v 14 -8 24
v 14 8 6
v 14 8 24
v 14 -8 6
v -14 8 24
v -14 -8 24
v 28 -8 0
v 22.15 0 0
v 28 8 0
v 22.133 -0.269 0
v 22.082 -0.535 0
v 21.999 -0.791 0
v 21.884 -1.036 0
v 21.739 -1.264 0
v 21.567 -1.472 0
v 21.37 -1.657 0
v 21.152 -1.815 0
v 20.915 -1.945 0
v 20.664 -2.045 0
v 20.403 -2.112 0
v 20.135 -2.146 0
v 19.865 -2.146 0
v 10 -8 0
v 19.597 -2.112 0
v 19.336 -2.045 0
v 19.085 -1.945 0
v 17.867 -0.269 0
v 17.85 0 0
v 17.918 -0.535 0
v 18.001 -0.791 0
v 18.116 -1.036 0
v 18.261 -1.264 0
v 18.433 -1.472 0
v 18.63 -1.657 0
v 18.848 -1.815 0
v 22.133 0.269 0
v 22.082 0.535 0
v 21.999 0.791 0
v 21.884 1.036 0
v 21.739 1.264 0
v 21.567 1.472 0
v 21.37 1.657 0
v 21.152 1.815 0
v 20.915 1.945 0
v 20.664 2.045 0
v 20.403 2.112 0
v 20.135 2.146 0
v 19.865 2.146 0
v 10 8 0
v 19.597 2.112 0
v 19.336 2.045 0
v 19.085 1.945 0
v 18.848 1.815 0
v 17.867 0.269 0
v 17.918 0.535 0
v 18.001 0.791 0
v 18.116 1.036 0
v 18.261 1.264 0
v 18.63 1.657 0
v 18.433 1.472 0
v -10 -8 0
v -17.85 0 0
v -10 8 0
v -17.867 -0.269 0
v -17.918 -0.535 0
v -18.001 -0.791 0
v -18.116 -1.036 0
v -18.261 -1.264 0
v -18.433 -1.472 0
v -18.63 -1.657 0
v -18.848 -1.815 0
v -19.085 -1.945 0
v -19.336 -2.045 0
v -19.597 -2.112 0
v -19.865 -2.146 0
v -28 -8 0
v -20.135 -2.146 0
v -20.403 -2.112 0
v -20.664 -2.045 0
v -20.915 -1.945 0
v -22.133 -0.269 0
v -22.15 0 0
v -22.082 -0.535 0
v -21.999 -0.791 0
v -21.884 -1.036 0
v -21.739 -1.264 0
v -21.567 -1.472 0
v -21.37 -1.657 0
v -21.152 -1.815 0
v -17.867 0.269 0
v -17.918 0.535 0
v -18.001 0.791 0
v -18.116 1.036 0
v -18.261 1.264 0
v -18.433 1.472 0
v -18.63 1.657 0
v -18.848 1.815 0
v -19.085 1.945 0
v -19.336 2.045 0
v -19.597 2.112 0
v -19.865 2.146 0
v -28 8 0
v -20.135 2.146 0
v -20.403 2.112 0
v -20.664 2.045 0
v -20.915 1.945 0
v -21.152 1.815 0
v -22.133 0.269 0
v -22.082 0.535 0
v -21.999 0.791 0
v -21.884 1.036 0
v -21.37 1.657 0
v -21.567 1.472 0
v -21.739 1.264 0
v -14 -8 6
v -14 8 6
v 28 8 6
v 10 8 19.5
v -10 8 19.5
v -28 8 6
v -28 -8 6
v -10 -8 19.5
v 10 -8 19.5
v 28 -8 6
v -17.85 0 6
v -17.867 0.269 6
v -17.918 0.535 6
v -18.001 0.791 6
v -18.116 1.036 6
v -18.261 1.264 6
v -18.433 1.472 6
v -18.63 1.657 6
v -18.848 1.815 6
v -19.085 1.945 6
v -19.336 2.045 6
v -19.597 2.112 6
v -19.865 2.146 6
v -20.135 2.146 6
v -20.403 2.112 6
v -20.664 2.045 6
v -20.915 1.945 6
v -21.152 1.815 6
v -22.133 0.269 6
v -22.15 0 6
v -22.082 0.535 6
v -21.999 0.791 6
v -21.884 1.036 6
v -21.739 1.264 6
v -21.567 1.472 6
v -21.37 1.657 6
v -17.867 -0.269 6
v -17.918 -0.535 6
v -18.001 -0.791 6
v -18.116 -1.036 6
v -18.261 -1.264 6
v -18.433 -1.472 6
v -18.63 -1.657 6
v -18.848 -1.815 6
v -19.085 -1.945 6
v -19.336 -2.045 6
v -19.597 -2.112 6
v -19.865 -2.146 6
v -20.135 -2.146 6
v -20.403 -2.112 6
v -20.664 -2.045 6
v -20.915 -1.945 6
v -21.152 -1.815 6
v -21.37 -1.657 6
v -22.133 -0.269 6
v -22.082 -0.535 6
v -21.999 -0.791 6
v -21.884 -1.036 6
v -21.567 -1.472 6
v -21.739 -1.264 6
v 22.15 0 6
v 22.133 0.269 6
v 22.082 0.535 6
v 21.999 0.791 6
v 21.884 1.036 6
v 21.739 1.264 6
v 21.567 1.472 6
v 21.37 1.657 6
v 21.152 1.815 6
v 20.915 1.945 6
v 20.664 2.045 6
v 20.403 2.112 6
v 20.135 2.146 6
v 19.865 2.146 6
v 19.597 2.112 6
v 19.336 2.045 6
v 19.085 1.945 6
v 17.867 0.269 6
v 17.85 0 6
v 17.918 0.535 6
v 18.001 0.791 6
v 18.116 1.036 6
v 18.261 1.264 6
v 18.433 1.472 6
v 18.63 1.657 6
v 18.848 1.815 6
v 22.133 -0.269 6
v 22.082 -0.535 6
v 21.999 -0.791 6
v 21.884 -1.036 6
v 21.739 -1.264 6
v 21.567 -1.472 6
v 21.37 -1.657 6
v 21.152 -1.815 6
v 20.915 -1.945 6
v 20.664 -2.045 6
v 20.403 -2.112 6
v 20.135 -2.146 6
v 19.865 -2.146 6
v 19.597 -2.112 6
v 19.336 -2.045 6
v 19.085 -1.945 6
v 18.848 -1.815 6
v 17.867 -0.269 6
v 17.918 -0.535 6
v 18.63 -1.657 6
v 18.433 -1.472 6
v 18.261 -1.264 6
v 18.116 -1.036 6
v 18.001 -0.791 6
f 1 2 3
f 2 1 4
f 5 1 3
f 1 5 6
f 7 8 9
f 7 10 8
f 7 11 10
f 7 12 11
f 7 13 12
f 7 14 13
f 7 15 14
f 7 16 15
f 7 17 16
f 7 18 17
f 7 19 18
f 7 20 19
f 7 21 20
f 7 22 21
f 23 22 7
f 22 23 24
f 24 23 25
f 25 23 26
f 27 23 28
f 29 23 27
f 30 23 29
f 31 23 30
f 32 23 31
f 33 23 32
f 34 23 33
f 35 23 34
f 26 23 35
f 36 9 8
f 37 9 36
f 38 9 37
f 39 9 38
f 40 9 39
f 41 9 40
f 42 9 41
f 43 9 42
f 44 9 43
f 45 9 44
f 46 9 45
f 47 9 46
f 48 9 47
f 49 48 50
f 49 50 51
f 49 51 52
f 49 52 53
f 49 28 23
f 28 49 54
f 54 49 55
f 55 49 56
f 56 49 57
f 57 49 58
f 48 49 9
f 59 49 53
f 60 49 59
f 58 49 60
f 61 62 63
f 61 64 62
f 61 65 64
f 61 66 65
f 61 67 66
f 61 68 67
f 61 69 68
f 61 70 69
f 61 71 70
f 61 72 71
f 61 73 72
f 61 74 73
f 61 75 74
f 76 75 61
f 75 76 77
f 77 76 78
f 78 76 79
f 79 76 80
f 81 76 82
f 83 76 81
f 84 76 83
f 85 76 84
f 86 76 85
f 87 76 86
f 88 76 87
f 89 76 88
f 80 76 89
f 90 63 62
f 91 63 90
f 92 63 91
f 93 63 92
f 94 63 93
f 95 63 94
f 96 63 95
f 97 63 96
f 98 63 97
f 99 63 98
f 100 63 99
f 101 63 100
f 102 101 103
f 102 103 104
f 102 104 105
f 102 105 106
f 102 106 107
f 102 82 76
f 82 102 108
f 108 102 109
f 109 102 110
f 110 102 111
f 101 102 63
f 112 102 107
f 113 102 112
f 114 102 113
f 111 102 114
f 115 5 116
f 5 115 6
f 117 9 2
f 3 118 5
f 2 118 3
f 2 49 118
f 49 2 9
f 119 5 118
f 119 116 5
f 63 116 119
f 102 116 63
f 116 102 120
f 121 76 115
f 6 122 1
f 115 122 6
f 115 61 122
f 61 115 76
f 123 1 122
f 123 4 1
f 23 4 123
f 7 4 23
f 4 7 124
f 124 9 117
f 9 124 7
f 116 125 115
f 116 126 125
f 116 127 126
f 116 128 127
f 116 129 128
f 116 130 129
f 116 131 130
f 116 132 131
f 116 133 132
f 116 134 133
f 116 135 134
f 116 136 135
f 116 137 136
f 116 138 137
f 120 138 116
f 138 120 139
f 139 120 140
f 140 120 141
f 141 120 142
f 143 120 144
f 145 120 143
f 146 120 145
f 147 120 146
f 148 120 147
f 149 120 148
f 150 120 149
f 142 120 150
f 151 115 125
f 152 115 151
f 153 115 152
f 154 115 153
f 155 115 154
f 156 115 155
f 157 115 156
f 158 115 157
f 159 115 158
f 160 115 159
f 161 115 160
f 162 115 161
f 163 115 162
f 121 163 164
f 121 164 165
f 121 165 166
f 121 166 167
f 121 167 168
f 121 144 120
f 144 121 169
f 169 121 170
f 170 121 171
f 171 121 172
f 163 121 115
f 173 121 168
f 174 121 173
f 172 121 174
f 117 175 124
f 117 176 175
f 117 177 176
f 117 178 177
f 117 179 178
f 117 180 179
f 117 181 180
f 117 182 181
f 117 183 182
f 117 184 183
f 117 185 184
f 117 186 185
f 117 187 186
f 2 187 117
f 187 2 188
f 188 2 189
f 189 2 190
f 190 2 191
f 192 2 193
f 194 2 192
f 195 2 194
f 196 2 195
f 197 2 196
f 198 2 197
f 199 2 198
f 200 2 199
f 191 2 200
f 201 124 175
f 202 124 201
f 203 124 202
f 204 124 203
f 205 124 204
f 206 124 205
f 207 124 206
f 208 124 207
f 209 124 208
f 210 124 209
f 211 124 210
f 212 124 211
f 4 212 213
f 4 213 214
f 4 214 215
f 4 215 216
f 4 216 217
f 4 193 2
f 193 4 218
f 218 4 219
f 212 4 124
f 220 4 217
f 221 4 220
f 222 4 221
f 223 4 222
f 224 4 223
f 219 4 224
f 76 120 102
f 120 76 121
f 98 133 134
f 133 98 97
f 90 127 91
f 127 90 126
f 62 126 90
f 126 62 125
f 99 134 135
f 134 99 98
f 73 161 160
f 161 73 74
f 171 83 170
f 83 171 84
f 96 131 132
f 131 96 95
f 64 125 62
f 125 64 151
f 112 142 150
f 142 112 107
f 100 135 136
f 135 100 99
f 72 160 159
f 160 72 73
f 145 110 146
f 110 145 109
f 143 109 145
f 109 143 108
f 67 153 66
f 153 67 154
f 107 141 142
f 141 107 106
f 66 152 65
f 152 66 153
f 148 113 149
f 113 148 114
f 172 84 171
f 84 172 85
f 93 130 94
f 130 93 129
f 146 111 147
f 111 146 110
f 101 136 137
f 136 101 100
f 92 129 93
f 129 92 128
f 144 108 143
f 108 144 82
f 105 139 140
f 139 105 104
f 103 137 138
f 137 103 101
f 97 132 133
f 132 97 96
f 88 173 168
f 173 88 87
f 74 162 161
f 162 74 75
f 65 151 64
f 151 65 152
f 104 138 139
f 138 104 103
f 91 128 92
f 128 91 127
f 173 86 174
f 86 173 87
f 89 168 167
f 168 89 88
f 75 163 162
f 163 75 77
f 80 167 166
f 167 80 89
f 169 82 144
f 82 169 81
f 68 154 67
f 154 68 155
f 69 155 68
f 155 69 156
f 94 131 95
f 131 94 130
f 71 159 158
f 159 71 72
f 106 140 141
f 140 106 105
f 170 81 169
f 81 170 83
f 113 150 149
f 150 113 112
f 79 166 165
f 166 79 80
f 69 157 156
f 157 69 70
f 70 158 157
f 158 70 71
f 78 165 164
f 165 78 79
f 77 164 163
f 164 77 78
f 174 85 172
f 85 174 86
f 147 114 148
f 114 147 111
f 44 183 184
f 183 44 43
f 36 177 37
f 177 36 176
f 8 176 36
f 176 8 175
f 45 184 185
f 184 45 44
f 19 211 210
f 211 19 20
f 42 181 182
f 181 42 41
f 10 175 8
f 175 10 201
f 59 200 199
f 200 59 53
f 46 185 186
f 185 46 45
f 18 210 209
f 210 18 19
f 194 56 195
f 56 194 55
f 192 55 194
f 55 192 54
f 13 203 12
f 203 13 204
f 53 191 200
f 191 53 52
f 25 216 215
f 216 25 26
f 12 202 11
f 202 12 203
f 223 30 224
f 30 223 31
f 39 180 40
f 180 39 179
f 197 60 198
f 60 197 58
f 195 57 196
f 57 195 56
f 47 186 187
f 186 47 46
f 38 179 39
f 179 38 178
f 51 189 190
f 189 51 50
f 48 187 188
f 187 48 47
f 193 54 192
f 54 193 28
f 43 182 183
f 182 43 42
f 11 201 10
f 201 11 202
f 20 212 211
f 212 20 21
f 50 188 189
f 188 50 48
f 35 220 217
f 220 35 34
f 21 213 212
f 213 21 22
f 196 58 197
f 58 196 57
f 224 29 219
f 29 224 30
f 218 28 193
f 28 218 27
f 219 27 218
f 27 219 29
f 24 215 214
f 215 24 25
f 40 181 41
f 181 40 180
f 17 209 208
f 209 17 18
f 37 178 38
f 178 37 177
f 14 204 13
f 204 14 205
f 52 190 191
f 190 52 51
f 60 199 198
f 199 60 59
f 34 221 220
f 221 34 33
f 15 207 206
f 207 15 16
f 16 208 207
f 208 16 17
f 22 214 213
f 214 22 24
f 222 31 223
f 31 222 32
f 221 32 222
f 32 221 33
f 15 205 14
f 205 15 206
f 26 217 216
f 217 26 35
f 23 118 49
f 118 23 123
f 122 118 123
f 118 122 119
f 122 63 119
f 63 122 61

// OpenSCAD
// file: util.scad
epsilon = 0.1;

module ring(in_rad, out_rad, height, fn = 50) {
    difference() {
        cylinder(r = out_rad, h = height, $fn = fn);
        translate([0,0,-epsilon])
           cylinder(r = in_rad, h = height+2*epsilon, $fn = fn);
    }
}
// file: params.scad
// Params for GT3 TimingBelt and accesories:
// belt
belt_width = 5;

// pulley
pulley_belt_width = belt_width * 1.2;


// General Params for the sketch
height = 700;
width = 600;
depth = 400;

profile_w = 20;

u_lower_rad = 70;
u_upper_rad = 20 + u_lower_rad;
u_lower_h = 20;
u_upper_h = 20;
u_main_hole_rad = 50;
rings_z_dist = 5;
axis_y_offset = 0;

stepper_w = 42.3;
stepper_box_h = 40;
stepper_axis_rad = 2.5;
stepper_axis_len = 24+2; // above box
stepper_all_h = stepper_box_h + stepper_axis_len;

axis_bot_elev = height - 85;
axis_top_above_upper_plate = 80;

camera_mount_rad = 300;
min_camera_z = 300;

slider_pole_w = 8;
slider_column_w = 80;

// tolerance for holes sliding on column:
slider_tol = 0.5;

camera_w = 140;
camera_d = 15;
camera_h = 40;

relief_depth = 2;

hand_support_bigR = 50;
hand_support_cutR = 20;
hand_lock_bigR = 65;
hand_lock_cutR = 10;
hand_lock_elev = 140;


// Params for main bearing plate
//   with its two rings:
glassBall_r = 8;
mainHole_r = 20;
wall_w = 4;

ring_base_w = 2*glassBall_r + 2*wall_w;
upper_ring_out_r = mainHole_r + ring_base_w;

// the angle (from horisontal) of 
//   the force ransform of the glassBalls: 
ring_contact_angle = 30;

// diff between the radiuses
//   of uper and lower rings:
ring_diff_r = 2*glassBall_r * sin(ring_contact_angle);

// the height of the slot between the rings:
ring_diff_h = glassBall_r/2;

bigger_ring_r = mainHole_r + ring_diff_r;
lower_ring_h = ring_base_w;

// maximum radious of all rings in this model:
max_r = mainHole_r + ring_base_w + 30;


// when using bearings:
bearing_in_d = 8;
bearing_out_d = 22;
bearing_h = 7;

big_washer_d = 19;


// Params for mounted camera slider:
profile2020_w = 20;
profile2020_tol = 0; // tolerance on each side (0 is OK)

M3hole_d = 3.3;
M4hole_d = 4.3;
hole_wall_dist = 4;

prof2020_fasten_plate_l = hole_wall_dist + wall_w + M4hole_d;

no_bend_beam_w = 2*wall_w;

fasten_plate_hole_dist = 10;
fasten_plate_l = 100;
fasten_plate_w = 120;
fasten_plate_h = wall_w;

rod_d = 8;
rod_holder_tol = 0; // on each side
rod_holder_fasten_block_l = 2*hole_wall_dist +
  2*fasten_plate_hole_dist + 2*M3hole_d/2;
rod_holder_fasten_block_w = 3*wall_w;
rod_holder_h = 4*wall_w;
rod_holder_fasten_h = 4*wall_w; // only the back fastener

holder_bend_len = 4;
holder_bend_close_gap = 3 + 2*rod_holder_tol;

stepper_holder_l = 4*wall_w;
// main file
include <params.scad>;
include <util.scad>

// profile2020 holder:

module prof2020_holder() {
  holder_w = profile2020_w + 2*wall_w; 
  holder_l = profile2020_w + 2*prof2020_fasten_plate_l;
  union() {
    difference() {
      cube([profile2020_w, holder_w, holder_w], center = true);

      cube([profile2020_w + 2*epsilon,
            profile2020_w + 2*profile2020_tol,
            profile2020_w + 2*profile2020_tol], center = true);
    }

    translate([0, 0, profile2020_w/2 + profile2020_tol + wall_w/2])
      difference() {
        cube([holder_l, profile2020_w, wall_w - profile2020_tol], center = true);

        translate([-profile2020_w/2 - hole_wall_dist - M4hole_d/2, 0, 0])
          cylinder(r = M4hole_d/2, h = wall_w+2*epsilon, center = true, $fn = 50);

        translate([profile2020_w/2 + hole_wall_dist + M4hole_d/2, 0, 0])
          cylinder(r = M4hole_d/2, h = wall_w+2*epsilon, center = true, $fn = 50);
    }

/* small test cubes on the sides - unneeded:
    translate([0, -(holder_w/2 + wall_w - epsilon), 0])
      cube(2*wall_w, center = true);
    translate([0, holder_w/2 + wall_w - epsilon, 0])
      cube(2*wall_w, center = true);
*/
    fasten_w = 4*fasten_plate_hole_dist + M3hole_d + 2*wall_w;
    fasten_l = fasten_plate_hole_dist + M3hole_d + 2*wall_w;
    fasten_h = 2*wall_w;
    translate([0, 0, holder_w/2 - fasten_h/2])
      difference() {
        cube([fasten_l, fasten_w, fasten_h], center = true);

        cube([fasten_l+2*epsilon, profile2020_w, fasten_h+2*epsilon], center = true);

        translate([-fasten_l/2 + wall_w + M3hole_d/2,
                   -fasten_w/2 + wall_w + M3hole_d/2, -fasten_h/2 - epsilon])
          fasten_holes_rect(2, 1, fasten_plate_hole_dist,
                            M3hole_d/2, 3*fasten_h + 2*epsilon);
        translate([-fasten_l/2 + wall_w + M3hole_d/2,
                   fasten_w/2 - (wall_w + M3hole_d/2), -fasten_h/2 - epsilon])
          fasten_holes_rect(2, 1, fasten_plate_hole_dist,
                            M3hole_d/2, 3*fasten_h + 2*epsilon);
    }
  }
}


// M8 rode holder:

rod_holder_in_r = rod_d/2 + rod_holder_tol;
rod_holder_out_r = rod_d/2 + rod_holder_tol + wall_w;

module rod_holder_ring() {
  ring(rod_holder_in_r,
       rod_holder_out_r,
       rod_holder_h);
}

module rod_holder() {
  union() {
    translate([0, -rod_holder_tol, 0])
      difference() {
        rod_holder_ring();
        
        translate([-rod_holder_out_r - epsilon, 0, -epsilon])
          cube([2*rod_holder_out_r + 2*epsilon,
                2*rod_holder_out_r + epsilon,
                rod_holder_h + 2*epsilon]);

        translate([-epsilon,
                   -holder_bend_close_gap/2 + epsilon,
                   -epsilon])
          cube([rod_holder_out_r + 2*epsilon,
                holder_bend_close_gap/2,
                rod_holder_h + 2*epsilon]);
      }
    translate([-rod_holder_out_r - holder_bend_len - epsilon, -rod_holder_tol - wall_w, 0])
      cube([holder_bend_len + wall_w,
            wall_w, rod_holder_h]);

    translate([0, rod_holder_tol, 0])
      difference() {
        rod_holder_ring();
        
        translate([-rod_holder_out_r - epsilon,
                   -(2*rod_holder_out_r + epsilon),
                   -epsilon])
          cube([2*rod_holder_out_r + 2*epsilon,
                2*rod_holder_out_r + epsilon,
                rod_holder_h + 2*epsilon]);
        
        translate([-epsilon, -epsilon, -epsilon])
          cube([rod_holder_out_r + 2*epsilon,
                holder_bend_close_gap/2,
                rod_holder_h + 2*epsilon]);
      }
    translate([-rod_holder_out_r - holder_bend_len - epsilon, rod_holder_tol, 0])
      cube([holder_bend_len + wall_w,
            wall_w, rod_holder_h]);
    
    // back fasten block:
    translate([-rod_holder_fasten_block_l - rod_holder_out_r - holder_bend_len, -1.5*wall_w, 0]) {
      difference() {  
        cube([rod_holder_fasten_block_l,
              rod_holder_fasten_block_w,
              rod_holder_fasten_h]);

        // back alongated hole for fastening in var angles:
        translate([hole_wall_dist + M3hole_d/2,
                   rod_holder_fasten_block_w/2, -epsilon])
          cylinder(r = M3hole_d/2,
                   h = rod_holder_fasten_h + 2*epsilon, $fn = 50);
        translate([hole_wall_dist + M3hole_d/2,
                   rod_holder_fasten_block_w/2 - M3hole_d/2, -epsilon])
          cube([fasten_plate_hole_dist, M3hole_d,
                   rod_holder_fasten_h + 2*epsilon]);
        translate([hole_wall_dist + M3hole_d/2 + fasten_plate_hole_dist,
                   rod_holder_fasten_block_w/2, -epsilon])
          cylinder(r = M3hole_d/2,
                   h = rod_holder_fasten_h + 2*epsilon, $fn = 50);

        translate([hole_wall_dist + M3hole_d/2 + 2*fasten_plate_hole_dist,
                   // rod_holder_fasten_block_l - (hole_wall_dist + M3hole_d/2),
                   1.5*wall_w, -epsilon])
          cylinder(r = M3hole_d/2,
                   h = rod_holder_fasten_h + 2*epsilon, $fn = 50);
      }
    }
    
    // closing holes:
    difference() {
      union() {
        translate([rod_holder_out_r - wall_w,
                   holder_bend_close_gap/2, 0])
          cube([wall_w + 3*M3hole_d,
                wall_w, rod_holder_h]);
        translate([rod_holder_out_r - wall_w,
                   -holder_bend_close_gap/2 - wall_w, 0])
          cube([wall_w + 3*M3hole_d,
                wall_w, rod_holder_h]);
      }
      translate([rod_holder_out_r + M3hole_d,
                 rod_holder_out_r, rod_holder_h/2])
        rotate([90, 0, 0])
          cylinder(r = M3hole_d/2,
                   h = 2*rod_holder_out_r, $fn = 50);
    }
  }
}


module fasten_holes_rect(nx, ny, hole_dist, hole_r, hole_h) {
  for (ix = [0:nx - 1])
    for (iy = [0:ny - 1]) {
      translate([ix*hole_dist,
                 iy*hole_dist, 0])
        cylinder(r = hole_r, h = hole_h, $fn = 50);
  }
}

module fasten_holes_interleave(nx, ny, hole_dist, hole_r, hole_h) {
  fasten_holes_rect(nx, ny, hole_dist, hole_r, hole_h);
  translate([hole_dist/2,
             hole_dist/2, 0])
    fasten_holes_rect(nx, ny, hole_dist, hole_r, hole_h);
}

module fasten_plate() {
  union()
    difference() {
      cube([fasten_plate_l, fasten_plate_w, fasten_plate_h]);

      translate([no_bend_beam_w + wall_w,
                 no_bend_beam_w + wall_w, -epsilon])
          import("fasten_holes_8x10_tst1.stl", convexity=4);

      // square hole for belt:
      translate([no_bend_beam_w + stepper_w,
                 no_bend_beam_w + fasten_plate_hole_dist + 2*wall_w, -epsilon])
        cube([fasten_plate_l, stepper_w - 2*wall_w, fasten_plate_h + 2*epsilon]);

      // square hole2 for prof2020 connector nuts:
      translate([2*no_bend_beam_w,
                 fasten_plate_w - no_bend_beam_w - wall_w -
                   prof2020_fasten_plate_l - profile2020_w, -epsilon])
        union() {
          cube([fasten_plate_l - 4*no_bend_beam_w,
                prof2020_fasten_plate_l/2,
                fasten_plate_h + 2*epsilon]);
          translate([0, prof2020_fasten_plate_l/2 + profile2020_w, 0])
            cube([fasten_plate_l - 4*no_bend_beam_w,
                  prof2020_fasten_plate_l/2,
                  fasten_plate_h + 2*epsilon]);
        }
    }

    cube([fasten_plate_l, no_bend_beam_w, no_bend_beam_w]);
    cube([no_bend_beam_w, fasten_plate_w, no_bend_beam_w]);
    translate([0, fasten_plate_w - no_bend_beam_w, 0])
          cube([fasten_plate_l, no_bend_beam_w, no_bend_beam_w]);
    translate([fasten_plate_l - no_bend_beam_w, 0, 0])
          cube([no_bend_beam_w, fasten_plate_w, no_bend_beam_w]);
}


module stepper_holder() {
  difference() {
    union() {
      translate([0, 0, (stepper_w + wall_w)/2])
        cube([stepper_w + 2*wall_w,
              stepper_holder_l,
              stepper_w + wall_w], center = true);

      translate([0, 0, wall_w])
        cube([stepper_w + 8*wall_w, stepper_holder_l,
              2*wall_w], center = true);
    }

    translate([0, 0, stepper_w/2 - epsilon])
      cube([stepper_w,
            stepper_holder_l + 2*epsilon,
            stepper_w + epsilon], center = true);

    translate([-3*fasten_plate_hole_dist, 0, -epsilon])
      fasten_holes_rect(2, 1, 6*fasten_plate_hole_dist,
                        M3hole_d/2, 2*wall_w + 2*epsilon);
  }
}

module prof2020_holder_to_table() {
  difference() {
    union() {
      translate([0, 0, (profile2020_w + wall_w)/2])
        cube([profile2020_w + 2*wall_w,
              stepper_holder_l,
              profile2020_w + wall_w], center = true);

      translate([0, 0, 0.75*wall_w])
        cube([profile2020_w + 9*wall_w, stepper_holder_l,
              1.5*wall_w], center = true);
    }

    translate([0, 0, profile2020_w/2 - 3*epsilon])
      cube([profile2020_w,
            stepper_holder_l + 2*epsilon,
            profile2020_w - 4*epsilon], center = true);

    translate([-2*fasten_plate_hole_dist, 0, -epsilon])
      fasten_holes_rect(2, 1, 4*fasten_plate_hole_dist,
                        M4hole_d/2, 2*wall_w + 2*epsilon);
  }
}


// testing:

//color("black") rod_holder_ring();

//fasten_holes_interleave(10, 10, fasten_plate_hole_dist, M3hole_d/2, fasten_plate_h + 2*epsilon);


// results:

//color("blue") prof2020_holder();

//color("green") rod_holder();

// generate separately file "fasten_holes_8x10.stl":
//fasten_holes_interleave(8, 10, fasten_plate_hole_dist, M3hole_d/2, fasten_plate_h + 2*epsilon);

//color("black") fasten_plate();

//color("red") stepper_holder();

color("white") prof2020_holder_to_table();
